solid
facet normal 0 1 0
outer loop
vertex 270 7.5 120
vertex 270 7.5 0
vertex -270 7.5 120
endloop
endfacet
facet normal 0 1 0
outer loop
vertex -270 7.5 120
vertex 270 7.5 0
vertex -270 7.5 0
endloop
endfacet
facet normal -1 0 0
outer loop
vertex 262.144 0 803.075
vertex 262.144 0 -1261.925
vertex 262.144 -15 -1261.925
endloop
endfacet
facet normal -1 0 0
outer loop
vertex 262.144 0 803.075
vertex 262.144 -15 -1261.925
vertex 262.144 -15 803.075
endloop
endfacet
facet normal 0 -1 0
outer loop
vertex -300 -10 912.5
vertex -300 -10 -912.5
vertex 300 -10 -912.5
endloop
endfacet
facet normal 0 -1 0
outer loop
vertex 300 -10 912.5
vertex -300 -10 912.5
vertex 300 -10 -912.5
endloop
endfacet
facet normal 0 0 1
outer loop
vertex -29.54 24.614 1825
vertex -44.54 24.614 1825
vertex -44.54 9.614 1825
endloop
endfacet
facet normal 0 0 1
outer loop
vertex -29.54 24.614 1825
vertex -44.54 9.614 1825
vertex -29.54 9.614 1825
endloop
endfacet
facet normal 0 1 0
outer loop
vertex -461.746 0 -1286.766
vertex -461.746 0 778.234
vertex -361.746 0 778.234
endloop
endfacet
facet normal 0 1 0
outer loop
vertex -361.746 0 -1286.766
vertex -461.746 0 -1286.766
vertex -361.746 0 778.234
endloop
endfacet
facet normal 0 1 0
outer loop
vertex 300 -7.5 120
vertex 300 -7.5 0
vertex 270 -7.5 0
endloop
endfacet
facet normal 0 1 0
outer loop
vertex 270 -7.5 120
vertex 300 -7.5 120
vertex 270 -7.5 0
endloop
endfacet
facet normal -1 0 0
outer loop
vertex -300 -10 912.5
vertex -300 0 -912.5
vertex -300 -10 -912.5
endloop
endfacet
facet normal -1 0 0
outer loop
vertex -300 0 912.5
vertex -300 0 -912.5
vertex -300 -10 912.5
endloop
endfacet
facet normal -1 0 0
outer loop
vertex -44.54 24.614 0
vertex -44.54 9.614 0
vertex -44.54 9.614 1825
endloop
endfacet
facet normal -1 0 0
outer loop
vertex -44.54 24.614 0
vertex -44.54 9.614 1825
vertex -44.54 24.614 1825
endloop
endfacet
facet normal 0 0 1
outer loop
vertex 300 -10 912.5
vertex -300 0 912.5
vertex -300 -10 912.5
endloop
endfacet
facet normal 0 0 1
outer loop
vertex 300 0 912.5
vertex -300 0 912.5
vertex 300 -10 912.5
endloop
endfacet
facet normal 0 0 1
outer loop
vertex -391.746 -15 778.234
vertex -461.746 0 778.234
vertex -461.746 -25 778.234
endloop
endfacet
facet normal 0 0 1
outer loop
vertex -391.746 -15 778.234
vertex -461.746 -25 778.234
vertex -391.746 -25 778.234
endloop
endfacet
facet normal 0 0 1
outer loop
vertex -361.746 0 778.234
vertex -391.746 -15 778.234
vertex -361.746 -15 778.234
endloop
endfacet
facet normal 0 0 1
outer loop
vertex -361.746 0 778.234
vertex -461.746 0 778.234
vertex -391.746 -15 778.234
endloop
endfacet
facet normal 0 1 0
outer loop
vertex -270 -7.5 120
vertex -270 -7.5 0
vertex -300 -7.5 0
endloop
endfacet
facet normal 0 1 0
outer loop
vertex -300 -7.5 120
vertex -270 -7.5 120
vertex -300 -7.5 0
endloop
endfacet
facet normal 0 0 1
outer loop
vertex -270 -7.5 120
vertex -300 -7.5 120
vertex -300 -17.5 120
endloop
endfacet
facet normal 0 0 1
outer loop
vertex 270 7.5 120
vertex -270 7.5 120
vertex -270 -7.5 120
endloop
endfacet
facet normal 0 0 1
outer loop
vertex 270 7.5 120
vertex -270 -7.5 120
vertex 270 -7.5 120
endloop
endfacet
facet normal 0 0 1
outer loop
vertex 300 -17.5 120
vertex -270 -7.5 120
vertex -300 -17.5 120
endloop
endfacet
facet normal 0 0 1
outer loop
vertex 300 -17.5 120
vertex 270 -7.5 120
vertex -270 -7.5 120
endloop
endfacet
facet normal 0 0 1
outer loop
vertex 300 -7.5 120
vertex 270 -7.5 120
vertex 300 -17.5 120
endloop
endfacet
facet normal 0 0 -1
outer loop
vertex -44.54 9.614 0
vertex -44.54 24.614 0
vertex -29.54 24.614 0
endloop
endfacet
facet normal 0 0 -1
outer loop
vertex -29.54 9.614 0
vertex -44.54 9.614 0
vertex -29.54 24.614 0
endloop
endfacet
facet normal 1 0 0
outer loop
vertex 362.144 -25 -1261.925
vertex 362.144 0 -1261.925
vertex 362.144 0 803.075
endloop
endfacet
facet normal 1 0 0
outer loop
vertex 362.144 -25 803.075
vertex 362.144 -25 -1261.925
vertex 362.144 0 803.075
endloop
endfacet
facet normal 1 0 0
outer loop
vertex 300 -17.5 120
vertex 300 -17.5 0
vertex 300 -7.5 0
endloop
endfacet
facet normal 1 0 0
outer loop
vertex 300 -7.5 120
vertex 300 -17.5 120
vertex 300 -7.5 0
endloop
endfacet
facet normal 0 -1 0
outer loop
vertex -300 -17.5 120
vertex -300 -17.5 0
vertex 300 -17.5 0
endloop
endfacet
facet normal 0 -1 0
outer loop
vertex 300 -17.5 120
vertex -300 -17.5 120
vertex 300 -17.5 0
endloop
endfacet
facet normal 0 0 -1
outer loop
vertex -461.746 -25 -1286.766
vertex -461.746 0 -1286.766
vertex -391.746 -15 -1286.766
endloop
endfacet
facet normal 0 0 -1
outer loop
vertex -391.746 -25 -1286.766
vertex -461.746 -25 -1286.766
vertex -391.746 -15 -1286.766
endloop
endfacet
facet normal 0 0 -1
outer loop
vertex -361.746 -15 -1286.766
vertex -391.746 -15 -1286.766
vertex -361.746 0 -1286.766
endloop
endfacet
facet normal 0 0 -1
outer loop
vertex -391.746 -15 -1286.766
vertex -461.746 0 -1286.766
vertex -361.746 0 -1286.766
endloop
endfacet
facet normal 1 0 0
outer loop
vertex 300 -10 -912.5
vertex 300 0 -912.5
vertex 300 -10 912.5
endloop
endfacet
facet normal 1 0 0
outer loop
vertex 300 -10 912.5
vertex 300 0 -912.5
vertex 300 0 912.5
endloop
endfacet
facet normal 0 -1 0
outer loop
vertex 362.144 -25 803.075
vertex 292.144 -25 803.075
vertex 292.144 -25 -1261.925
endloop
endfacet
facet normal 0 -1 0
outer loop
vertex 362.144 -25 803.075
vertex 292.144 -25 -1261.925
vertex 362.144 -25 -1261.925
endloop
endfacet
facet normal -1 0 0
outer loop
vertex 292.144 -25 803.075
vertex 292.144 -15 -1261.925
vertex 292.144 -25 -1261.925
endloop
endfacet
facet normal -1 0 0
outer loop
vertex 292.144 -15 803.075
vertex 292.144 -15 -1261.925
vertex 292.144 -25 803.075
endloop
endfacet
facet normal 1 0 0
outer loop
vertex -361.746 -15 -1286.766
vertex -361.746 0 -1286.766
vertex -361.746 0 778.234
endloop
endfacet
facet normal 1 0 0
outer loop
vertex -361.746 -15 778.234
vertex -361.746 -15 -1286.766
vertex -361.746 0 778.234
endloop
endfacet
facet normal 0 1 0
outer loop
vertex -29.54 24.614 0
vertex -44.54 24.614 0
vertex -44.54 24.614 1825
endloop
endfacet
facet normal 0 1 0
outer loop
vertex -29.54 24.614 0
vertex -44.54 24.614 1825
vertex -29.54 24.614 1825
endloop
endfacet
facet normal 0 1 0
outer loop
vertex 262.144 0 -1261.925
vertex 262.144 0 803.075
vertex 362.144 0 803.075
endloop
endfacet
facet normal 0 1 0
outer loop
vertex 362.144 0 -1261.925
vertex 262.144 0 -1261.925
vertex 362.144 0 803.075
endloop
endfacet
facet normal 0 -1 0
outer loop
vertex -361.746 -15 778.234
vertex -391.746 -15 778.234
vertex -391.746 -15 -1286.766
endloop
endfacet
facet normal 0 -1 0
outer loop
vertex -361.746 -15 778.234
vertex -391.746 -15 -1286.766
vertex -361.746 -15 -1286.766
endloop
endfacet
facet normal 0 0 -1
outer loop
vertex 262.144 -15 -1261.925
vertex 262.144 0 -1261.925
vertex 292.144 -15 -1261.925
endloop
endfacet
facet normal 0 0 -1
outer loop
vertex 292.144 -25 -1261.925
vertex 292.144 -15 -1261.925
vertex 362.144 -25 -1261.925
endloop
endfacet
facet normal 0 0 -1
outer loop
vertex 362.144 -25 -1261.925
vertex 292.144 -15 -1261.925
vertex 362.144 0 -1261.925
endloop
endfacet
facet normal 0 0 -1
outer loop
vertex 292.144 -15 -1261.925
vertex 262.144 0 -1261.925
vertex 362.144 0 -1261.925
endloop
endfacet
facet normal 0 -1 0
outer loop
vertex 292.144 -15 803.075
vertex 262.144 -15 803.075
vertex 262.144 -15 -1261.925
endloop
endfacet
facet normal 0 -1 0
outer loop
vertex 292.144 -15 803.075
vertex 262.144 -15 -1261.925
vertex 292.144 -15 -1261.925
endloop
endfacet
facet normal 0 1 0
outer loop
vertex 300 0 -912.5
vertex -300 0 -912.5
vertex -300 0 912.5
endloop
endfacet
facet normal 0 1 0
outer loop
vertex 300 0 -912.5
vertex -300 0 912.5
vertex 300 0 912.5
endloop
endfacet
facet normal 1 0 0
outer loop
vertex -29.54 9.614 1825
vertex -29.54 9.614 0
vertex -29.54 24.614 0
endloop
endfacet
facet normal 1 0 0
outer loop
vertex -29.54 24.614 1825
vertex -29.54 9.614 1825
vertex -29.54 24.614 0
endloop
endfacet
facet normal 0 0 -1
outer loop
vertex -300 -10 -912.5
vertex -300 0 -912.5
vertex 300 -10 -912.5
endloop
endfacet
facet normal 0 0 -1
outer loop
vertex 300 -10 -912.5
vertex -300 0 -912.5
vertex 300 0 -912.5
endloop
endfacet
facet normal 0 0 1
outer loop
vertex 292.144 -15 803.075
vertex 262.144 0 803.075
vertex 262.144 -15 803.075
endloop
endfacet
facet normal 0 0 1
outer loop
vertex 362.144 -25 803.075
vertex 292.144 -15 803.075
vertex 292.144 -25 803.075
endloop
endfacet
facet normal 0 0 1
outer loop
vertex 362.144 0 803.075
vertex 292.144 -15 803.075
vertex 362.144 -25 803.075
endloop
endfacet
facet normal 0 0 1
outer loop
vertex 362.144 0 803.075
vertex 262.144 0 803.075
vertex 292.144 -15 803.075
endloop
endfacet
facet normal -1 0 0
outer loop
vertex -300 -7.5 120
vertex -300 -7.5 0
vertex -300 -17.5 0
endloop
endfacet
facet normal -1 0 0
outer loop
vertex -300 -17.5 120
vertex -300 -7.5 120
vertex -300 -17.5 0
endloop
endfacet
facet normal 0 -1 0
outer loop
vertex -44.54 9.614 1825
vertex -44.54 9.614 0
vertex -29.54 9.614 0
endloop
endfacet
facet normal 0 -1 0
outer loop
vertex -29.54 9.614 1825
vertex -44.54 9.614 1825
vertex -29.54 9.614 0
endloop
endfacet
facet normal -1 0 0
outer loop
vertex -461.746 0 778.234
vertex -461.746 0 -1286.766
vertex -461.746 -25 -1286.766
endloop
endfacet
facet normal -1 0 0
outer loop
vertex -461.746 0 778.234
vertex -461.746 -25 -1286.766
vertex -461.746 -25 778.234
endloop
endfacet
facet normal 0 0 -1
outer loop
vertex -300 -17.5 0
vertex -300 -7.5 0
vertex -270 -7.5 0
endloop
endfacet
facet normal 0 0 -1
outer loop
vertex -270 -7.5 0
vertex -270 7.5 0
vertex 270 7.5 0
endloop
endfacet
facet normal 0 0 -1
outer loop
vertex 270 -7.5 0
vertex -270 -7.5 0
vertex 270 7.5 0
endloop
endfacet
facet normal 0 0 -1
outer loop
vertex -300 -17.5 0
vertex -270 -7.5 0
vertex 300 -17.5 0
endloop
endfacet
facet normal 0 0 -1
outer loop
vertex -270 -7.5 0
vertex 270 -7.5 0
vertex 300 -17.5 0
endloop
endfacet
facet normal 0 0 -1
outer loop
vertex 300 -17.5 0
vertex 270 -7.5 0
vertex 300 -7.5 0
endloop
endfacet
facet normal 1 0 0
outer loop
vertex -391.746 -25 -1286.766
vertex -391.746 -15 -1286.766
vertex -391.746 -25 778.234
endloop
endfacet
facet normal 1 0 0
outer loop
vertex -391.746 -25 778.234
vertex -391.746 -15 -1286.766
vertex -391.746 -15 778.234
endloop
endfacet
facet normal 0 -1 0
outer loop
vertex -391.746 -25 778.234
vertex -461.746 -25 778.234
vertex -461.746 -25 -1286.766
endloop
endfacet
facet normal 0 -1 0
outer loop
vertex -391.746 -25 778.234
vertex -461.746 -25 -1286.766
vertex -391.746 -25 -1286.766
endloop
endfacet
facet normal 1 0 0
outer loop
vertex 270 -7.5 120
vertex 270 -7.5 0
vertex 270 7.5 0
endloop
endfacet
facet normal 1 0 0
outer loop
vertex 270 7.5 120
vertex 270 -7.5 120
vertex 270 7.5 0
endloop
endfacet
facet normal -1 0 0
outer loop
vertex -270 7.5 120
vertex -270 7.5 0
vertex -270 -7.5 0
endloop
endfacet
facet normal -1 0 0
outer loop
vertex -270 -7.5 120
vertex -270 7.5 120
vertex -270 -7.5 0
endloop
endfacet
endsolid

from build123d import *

# Parameters (mm, degrees)
F1_DEPTH  = 120
F2_W      = 70
F2_H      = 2065
F3_DEPTH  = 25
F2_W_2    = 30
F4_DEPTH  = 15
F5_W      = 70
F5_H      = 2065
F6_DEPTH  = 25
F5_W_2    = 30
F7_DEPTH  = 15
F8_W      = 600
F8_H      = 1825
F9_DEPTH  = 10
F10_W     = 15
F10_H     = 15
F11_DEPTH = 1825


with BuildPart() as f1:
    # F0 (on Top) → F1 (new body)
    with BuildSketch(Plane.XY):
        Polygon((270, 7.5), (-270, 7.5), (-270, -7.5), (-300, -7.5), (-300, -17.5), (300, -17.5), (300, -7.5), (270, -7.5), align=None)
    extrude(amount=F1_DEPTH)


with BuildPart() as f3:
    # F2 (on Front) → F3 (new body)
    with BuildSketch(Plane.XZ):
        with Locations((-426.7459588306, -254.2664706707)):
            Rectangle(F2_W, F2_H)
    extrude(amount=F3_DEPTH)

    # F2 (on Front) → F4 (join)
    with BuildSketch(Plane.XZ):
        with Locations((-376.7459588306, -254.2664706707)):
            Rectangle(F2_W_2, F2_H)
    extrude(amount=F4_DEPTH)


with BuildPart() as f6:
    # F5 (on Front) → F6 (new body)
    with BuildSketch(Plane.XZ):
        with Locations((327.1437698603, -229.4254589081)):
            Rectangle(F5_W, F5_H)
    extrude(amount=F6_DEPTH)

    # F5 (on Front) → F7 (join)
    with BuildSketch(Plane.XZ):
        with Locations((277.1437698603, -229.4254589081)):
            Rectangle(F5_W_2, F5_H)
    extrude(amount=F7_DEPTH)


with BuildPart() as f9:
    # F8 (on Front) → F9 (new body)
    with BuildSketch(Plane.XZ):
        Rectangle(F8_W, F8_H)
    extrude(amount=F9_DEPTH)


with BuildPart() as f11:
    # F10 (on Top) → F11 (new body)
    with BuildSketch(Plane.XY):
        with Locations((-37.039745599, 17.1142700847)):
            Rectangle(F10_W, F10_H)
    extrude(amount=F11_DEPTH)


solid = Compound([f1.part, f3.part, f6.part, f9.part, f11.part])
